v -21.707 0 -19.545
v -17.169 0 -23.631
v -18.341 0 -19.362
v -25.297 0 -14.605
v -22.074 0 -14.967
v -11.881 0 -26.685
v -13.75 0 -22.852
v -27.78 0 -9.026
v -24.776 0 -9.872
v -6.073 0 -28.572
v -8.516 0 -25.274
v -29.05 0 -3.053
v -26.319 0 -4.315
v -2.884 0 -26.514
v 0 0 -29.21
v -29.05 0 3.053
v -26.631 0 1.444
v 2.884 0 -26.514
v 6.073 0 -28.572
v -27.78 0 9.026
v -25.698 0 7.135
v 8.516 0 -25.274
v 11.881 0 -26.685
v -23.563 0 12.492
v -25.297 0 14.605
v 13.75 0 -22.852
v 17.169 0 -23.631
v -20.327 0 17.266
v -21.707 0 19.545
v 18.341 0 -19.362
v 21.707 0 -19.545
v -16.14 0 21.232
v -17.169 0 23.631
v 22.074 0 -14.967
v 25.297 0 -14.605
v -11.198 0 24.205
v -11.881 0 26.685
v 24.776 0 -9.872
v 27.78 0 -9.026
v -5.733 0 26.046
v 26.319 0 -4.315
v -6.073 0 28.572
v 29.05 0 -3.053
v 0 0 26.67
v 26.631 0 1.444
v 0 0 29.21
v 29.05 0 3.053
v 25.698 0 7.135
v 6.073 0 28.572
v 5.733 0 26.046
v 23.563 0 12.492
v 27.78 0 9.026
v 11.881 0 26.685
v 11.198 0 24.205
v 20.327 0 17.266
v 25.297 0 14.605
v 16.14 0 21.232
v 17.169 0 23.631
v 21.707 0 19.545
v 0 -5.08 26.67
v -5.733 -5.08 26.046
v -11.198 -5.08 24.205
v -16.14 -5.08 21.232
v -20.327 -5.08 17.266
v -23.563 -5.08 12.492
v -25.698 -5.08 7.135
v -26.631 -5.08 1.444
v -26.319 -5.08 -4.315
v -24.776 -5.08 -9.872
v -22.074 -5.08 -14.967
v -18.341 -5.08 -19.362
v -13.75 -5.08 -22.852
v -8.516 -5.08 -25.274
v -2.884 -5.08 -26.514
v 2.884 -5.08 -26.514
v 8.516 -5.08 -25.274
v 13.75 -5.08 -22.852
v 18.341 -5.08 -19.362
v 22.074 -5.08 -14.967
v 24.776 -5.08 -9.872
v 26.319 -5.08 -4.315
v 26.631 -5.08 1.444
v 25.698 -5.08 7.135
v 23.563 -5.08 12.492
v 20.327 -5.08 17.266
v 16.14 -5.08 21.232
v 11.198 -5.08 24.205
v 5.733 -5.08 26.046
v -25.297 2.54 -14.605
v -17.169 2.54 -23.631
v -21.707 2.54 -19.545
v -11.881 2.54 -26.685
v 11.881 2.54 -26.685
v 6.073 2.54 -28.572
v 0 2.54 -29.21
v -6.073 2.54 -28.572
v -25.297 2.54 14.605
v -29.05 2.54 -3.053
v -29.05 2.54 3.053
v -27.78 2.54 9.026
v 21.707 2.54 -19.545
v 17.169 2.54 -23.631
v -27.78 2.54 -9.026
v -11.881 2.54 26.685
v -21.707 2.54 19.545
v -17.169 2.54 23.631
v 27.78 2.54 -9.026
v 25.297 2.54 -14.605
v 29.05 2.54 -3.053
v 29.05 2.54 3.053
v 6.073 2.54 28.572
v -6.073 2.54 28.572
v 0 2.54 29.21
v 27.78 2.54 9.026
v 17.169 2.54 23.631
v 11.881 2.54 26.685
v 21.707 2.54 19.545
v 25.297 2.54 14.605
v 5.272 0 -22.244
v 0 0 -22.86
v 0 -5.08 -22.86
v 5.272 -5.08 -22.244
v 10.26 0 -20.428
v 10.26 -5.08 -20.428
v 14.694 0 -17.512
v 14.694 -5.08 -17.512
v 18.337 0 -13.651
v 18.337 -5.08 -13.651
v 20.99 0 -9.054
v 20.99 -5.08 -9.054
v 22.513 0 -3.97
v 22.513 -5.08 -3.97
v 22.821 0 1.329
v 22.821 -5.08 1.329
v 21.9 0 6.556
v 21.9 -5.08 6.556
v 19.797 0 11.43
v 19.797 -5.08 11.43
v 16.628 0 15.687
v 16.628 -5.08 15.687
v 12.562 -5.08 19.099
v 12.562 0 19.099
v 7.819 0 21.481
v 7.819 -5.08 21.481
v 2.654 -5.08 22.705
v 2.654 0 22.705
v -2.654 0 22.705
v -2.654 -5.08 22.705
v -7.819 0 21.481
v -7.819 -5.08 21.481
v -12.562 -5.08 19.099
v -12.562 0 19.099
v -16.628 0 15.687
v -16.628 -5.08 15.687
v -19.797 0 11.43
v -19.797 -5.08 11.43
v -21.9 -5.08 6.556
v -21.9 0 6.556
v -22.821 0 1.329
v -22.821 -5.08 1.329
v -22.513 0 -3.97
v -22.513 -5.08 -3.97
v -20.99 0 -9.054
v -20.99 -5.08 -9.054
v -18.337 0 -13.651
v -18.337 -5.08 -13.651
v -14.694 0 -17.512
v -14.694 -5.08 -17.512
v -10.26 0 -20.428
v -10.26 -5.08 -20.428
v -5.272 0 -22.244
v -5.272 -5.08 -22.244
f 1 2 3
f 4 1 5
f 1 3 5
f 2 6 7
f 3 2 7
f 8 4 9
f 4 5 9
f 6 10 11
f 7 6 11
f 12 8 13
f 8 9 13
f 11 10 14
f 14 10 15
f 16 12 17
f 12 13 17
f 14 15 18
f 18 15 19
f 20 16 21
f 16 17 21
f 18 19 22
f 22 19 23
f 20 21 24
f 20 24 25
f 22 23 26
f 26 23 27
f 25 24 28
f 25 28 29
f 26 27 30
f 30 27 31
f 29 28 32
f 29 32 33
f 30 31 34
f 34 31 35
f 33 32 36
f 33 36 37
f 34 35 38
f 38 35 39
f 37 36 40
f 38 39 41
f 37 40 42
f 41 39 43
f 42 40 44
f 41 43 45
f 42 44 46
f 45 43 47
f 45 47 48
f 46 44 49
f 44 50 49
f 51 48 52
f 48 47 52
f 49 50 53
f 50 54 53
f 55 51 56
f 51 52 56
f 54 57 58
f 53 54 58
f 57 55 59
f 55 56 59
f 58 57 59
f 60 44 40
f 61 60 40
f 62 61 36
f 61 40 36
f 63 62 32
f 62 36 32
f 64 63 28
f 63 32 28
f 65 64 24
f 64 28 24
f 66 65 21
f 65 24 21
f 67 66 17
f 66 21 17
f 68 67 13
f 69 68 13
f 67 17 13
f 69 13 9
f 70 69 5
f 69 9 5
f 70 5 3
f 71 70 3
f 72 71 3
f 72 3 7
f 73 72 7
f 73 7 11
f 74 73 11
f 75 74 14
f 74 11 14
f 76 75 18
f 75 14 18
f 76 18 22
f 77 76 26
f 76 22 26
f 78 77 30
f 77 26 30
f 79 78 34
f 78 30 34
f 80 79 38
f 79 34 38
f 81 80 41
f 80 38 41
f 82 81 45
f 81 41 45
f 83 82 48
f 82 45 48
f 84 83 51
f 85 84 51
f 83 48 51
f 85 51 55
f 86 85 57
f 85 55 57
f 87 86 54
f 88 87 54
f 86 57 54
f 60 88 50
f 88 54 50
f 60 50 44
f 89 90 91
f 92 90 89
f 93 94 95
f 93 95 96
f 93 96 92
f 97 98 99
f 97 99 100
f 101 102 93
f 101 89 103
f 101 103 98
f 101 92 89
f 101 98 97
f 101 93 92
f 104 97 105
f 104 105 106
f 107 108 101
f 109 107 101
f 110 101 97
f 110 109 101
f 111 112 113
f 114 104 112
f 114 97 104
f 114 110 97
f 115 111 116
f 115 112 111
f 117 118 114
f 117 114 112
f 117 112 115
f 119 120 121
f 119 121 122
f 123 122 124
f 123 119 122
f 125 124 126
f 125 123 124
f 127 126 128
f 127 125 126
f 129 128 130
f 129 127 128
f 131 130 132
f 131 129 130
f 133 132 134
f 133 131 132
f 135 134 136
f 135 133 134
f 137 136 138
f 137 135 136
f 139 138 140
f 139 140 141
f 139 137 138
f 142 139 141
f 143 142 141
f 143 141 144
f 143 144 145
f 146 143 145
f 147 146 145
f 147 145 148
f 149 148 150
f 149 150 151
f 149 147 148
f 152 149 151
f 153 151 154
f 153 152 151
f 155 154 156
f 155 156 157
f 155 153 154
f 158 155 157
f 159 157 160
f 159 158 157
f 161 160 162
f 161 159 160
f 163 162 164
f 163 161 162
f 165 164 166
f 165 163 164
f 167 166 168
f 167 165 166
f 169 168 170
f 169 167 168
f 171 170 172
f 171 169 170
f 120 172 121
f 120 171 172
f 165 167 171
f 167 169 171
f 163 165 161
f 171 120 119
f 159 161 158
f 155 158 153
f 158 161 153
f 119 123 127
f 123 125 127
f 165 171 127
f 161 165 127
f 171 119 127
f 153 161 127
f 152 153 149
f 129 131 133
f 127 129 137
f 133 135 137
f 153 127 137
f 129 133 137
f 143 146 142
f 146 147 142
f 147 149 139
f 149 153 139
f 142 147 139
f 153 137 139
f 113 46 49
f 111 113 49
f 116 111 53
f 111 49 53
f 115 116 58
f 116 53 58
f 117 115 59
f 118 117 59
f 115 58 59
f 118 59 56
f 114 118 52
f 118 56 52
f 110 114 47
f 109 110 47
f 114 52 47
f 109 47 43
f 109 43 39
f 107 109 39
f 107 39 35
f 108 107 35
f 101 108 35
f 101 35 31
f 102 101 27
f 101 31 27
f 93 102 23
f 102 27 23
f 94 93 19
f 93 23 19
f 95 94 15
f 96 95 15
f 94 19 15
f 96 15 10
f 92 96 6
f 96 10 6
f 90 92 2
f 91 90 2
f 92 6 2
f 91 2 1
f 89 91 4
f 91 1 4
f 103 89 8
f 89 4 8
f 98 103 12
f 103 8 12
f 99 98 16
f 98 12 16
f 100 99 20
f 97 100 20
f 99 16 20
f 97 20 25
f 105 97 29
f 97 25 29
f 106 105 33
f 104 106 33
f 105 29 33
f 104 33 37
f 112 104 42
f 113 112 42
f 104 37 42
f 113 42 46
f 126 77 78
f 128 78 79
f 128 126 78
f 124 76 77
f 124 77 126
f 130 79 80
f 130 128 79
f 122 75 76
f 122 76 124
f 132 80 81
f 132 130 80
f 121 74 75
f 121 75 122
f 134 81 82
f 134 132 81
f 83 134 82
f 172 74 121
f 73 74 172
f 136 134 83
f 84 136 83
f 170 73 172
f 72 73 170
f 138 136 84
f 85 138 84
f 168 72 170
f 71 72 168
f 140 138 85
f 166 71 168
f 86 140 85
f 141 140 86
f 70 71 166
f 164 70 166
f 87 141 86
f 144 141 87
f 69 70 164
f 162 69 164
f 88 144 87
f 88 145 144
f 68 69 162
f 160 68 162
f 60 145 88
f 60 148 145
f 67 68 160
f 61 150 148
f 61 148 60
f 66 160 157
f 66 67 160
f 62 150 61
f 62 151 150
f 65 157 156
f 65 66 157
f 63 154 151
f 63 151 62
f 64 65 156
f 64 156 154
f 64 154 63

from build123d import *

# Parameters (mm, degrees)
SKETCH1_R           = 29.21
BOSS_EXTRUDE2_DEPTH = 2.54
SKETCH2_R           = 26.67
SKETCH2_R_2         = 22.86
BOSS_EXTRUDE3_DEPTH = 5.08


with BuildPart() as part:
    # Sketch1 → Boss-Extrude2 (new body)
    with BuildSketch(Plane(origin=(0, 0, 0), x_dir=(1, 0, 0), z_dir=(0, 1, 0))):
        with Locations(Location((0, 0, 0), (0, 0, 270))):
            Circle(SKETCH1_R)
    extrude(amount=BOSS_EXTRUDE2_DEPTH)

    # Sketch2 → Boss-Extrude3 (add)
    with BuildSketch(Plane.XZ):
        with Locations(Location((0, 0, 0), (0, 0, 90))):
            Circle(SKETCH2_R)
        with Locations(Location((0, 0, 0), (0, 0, 270))):
            Circle(SKETCH2_R_2, mode=Mode.SUBTRACT)
    extrude(amount=BOSS_EXTRUDE3_DEPTH)


solid = part.part
